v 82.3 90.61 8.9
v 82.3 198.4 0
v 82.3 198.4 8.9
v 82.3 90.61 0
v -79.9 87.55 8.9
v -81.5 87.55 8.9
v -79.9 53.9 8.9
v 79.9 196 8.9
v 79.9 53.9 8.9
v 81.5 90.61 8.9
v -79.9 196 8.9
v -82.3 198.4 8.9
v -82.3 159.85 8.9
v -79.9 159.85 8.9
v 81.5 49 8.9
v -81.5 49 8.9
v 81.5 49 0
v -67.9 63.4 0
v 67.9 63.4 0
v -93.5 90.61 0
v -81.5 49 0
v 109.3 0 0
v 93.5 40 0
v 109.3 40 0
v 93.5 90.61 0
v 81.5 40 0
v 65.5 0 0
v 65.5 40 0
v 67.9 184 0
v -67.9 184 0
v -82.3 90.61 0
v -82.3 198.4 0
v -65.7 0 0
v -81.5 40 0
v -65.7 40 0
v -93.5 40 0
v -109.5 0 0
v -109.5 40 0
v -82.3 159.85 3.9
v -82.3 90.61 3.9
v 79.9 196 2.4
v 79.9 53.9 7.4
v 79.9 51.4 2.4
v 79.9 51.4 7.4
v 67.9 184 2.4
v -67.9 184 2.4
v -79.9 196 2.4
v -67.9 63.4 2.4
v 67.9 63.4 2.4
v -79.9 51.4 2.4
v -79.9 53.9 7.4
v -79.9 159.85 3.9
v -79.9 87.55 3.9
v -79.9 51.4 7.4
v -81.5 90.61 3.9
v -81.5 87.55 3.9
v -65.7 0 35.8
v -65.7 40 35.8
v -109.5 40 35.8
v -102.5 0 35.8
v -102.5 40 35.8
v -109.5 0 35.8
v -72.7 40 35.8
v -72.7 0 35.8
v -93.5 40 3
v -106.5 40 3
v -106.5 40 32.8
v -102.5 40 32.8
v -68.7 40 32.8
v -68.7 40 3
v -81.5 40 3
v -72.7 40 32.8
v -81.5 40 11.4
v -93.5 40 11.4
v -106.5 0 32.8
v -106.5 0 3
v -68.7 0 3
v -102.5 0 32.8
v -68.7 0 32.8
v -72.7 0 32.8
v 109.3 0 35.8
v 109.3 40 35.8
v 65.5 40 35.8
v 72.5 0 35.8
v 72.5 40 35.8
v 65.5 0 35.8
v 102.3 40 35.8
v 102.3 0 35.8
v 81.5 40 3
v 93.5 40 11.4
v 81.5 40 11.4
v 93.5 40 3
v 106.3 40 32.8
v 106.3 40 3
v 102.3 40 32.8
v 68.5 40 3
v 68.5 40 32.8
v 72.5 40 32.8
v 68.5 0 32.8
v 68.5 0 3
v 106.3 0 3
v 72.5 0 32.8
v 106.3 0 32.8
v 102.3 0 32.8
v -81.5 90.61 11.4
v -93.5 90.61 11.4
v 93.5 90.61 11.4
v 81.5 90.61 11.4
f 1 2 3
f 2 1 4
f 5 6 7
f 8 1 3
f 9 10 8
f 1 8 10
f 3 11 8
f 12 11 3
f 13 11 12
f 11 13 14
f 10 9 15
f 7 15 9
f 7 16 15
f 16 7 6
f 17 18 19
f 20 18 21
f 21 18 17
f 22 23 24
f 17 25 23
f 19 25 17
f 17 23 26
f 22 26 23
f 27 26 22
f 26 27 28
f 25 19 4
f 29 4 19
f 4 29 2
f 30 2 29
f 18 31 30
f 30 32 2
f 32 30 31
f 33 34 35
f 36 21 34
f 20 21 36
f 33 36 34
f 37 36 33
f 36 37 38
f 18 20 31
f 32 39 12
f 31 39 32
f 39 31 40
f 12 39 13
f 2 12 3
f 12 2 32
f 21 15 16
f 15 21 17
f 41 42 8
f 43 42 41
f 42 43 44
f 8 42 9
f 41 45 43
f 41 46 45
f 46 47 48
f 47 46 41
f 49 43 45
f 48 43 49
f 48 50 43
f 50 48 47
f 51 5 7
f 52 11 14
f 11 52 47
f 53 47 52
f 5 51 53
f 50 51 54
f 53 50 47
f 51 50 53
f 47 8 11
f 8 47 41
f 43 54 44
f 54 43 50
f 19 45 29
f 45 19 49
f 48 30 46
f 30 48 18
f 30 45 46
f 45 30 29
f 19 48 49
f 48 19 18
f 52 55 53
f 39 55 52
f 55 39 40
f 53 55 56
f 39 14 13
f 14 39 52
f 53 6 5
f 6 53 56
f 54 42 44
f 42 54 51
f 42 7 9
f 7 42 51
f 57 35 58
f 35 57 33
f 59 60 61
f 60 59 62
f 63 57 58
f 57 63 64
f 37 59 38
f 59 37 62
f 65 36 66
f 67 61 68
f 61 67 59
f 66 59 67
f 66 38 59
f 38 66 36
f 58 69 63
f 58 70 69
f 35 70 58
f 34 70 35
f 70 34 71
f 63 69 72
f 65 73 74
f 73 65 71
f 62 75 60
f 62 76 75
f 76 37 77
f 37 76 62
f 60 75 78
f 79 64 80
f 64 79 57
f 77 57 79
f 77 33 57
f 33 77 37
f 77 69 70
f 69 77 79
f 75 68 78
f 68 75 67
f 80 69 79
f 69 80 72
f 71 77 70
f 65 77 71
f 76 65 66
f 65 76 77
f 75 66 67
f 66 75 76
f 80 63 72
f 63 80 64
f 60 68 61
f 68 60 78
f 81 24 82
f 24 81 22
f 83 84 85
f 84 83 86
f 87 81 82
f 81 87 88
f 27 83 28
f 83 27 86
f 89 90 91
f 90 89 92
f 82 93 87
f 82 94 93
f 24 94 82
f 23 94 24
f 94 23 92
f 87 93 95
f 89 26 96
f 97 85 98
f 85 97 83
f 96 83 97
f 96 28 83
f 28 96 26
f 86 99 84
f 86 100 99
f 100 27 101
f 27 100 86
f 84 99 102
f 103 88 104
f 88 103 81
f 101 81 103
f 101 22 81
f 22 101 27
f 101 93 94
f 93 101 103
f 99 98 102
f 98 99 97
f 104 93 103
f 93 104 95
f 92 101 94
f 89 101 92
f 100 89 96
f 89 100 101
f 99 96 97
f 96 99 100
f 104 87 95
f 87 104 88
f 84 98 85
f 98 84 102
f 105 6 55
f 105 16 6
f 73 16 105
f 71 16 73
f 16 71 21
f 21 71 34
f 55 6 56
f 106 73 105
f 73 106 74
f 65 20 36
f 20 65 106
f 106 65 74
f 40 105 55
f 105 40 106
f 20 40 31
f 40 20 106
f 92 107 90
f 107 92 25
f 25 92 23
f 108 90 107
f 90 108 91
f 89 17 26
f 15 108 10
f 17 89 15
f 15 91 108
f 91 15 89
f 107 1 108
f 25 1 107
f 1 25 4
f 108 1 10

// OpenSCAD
// Z Fold8 Ultra -> Mocagen MC1 front-offset tray (parametric, OpenSCAD)
// STATUS: UNVERIFIED. Phone dims come from the spec sheet; the MC1 grip
// dimensions below are PLACEHOLDERS - measure your controller and edit them.

orientation = "landscape";   // "landscape" or "portrait"

// ---- Phone (unfolded) ----
phone_long   = 158.4;
phone_short  = 143.2;   // corrected from spec (132.6) per retailer listings
phone_thick  = 4.1;    // corrected from spec (5.5)
pad_clear    = 1.4;          // XY expansion for scratch-safe pads (spec)

// ---- Tray ----
tray_depth   = 6.5;          // bounding depth (spec)
wall         = 2.4;
lip_height   = 6;            // bottom retention lip rise
lip_overhang = 2.5;          // how far lip wraps over screen edge
standoff     = 9;            // forward offset from faceplate (spec: 8-10)

// ---- MC1 grip clip (PLACEHOLDERS - MEASURE!) ----
grip_w       = 38;           // handle width the jaw wraps
grip_t       = 30;           // handle thickness
interference = 0.2;          // jaw tighter than grip (spec)
jaw_wall     = 3;
clip_len     = 40;           // clip length along handle axis
clip_gap_x   = 175;          // centre-to-centre of the two clips (set to your MC1 extended width)

// ---- Derived ----
bucket_w = (orientation == "landscape" ? phone_long : phone_short) + pad_clear;
bucket_h = (orientation == "landscape" ? phone_short : phone_long) + pad_clear;
plate_w  = max(bucket_w + 2*wall, clip_gap_x + grip_w + 2*jaw_wall);

module tray() {
  difference() {
    // backplate + cradle walls
    translate([-bucket_w/2 - wall, 0, 0])
      cube([bucket_w + 2*wall, bucket_h + 2*wall, wall + tray_depth]);
    // phone pocket
    translate([-bucket_w/2, wall, wall])
      cube([bucket_w, bucket_h, tray_depth + 1]);
    // open the back to save plastic / allow heat
    translate([-bucket_w/2 + 12, wall + 12, -1])
      cube([bucket_w - 24, bucket_h - 24, wall + 2]);
    // side windows for buttons & hinge access
    translate([-bucket_w/2 - wall - 1, wall + bucket_h*0.25, wall + 1.5])
      cube([wall + 2, bucket_h*0.5, tray_depth]);
  }
  // bottom retention lip
  translate([-bucket_w/2 - wall, 0, 0])
    cube([bucket_w + 2*wall, wall, wall + lip_height]);
  translate([-bucket_w/2, wall, wall + tray_depth - 1.5])
    cube([bucket_w, lip_overhang, 1.5]);
}

module clip() {
  jaw_in = grip_w - interference;     // 0.2 mm interference fit
  jaw_t  = grip_t - interference;
  difference() {
    cube([jaw_in + 2*jaw_wall, clip_len, jaw_t + 2*jaw_wall]);
    translate([jaw_wall, -1, jaw_wall]) cube([jaw_in, clip_len + 2, jaw_t]);
    // flex slot: open one side so the jaw snaps on
    translate([jaw_wall + 4, -1, jaw_wall + jaw_t - 0.01])
      cube([jaw_in - 8, clip_len + 2, jaw_wall + 1]);
  }
}

module standoff_bridge(x) {
  // rigid column from clip up to the tray, offset forward by `standoff`
  translate([x - 6, clip_len, 0]) cube([12, bucket_h * 0.35, wall + standoff]);
}

union() {
  translate([0, clip_len + standoff, 0]) tray();
  for (s = [-1, 1]) {
    translate([s*clip_gap_x/2 - (grip_w + 2*jaw_wall)/2, 0, 0]) clip();
    standoff_bridge(s*clip_gap_x/2);
  }
}
